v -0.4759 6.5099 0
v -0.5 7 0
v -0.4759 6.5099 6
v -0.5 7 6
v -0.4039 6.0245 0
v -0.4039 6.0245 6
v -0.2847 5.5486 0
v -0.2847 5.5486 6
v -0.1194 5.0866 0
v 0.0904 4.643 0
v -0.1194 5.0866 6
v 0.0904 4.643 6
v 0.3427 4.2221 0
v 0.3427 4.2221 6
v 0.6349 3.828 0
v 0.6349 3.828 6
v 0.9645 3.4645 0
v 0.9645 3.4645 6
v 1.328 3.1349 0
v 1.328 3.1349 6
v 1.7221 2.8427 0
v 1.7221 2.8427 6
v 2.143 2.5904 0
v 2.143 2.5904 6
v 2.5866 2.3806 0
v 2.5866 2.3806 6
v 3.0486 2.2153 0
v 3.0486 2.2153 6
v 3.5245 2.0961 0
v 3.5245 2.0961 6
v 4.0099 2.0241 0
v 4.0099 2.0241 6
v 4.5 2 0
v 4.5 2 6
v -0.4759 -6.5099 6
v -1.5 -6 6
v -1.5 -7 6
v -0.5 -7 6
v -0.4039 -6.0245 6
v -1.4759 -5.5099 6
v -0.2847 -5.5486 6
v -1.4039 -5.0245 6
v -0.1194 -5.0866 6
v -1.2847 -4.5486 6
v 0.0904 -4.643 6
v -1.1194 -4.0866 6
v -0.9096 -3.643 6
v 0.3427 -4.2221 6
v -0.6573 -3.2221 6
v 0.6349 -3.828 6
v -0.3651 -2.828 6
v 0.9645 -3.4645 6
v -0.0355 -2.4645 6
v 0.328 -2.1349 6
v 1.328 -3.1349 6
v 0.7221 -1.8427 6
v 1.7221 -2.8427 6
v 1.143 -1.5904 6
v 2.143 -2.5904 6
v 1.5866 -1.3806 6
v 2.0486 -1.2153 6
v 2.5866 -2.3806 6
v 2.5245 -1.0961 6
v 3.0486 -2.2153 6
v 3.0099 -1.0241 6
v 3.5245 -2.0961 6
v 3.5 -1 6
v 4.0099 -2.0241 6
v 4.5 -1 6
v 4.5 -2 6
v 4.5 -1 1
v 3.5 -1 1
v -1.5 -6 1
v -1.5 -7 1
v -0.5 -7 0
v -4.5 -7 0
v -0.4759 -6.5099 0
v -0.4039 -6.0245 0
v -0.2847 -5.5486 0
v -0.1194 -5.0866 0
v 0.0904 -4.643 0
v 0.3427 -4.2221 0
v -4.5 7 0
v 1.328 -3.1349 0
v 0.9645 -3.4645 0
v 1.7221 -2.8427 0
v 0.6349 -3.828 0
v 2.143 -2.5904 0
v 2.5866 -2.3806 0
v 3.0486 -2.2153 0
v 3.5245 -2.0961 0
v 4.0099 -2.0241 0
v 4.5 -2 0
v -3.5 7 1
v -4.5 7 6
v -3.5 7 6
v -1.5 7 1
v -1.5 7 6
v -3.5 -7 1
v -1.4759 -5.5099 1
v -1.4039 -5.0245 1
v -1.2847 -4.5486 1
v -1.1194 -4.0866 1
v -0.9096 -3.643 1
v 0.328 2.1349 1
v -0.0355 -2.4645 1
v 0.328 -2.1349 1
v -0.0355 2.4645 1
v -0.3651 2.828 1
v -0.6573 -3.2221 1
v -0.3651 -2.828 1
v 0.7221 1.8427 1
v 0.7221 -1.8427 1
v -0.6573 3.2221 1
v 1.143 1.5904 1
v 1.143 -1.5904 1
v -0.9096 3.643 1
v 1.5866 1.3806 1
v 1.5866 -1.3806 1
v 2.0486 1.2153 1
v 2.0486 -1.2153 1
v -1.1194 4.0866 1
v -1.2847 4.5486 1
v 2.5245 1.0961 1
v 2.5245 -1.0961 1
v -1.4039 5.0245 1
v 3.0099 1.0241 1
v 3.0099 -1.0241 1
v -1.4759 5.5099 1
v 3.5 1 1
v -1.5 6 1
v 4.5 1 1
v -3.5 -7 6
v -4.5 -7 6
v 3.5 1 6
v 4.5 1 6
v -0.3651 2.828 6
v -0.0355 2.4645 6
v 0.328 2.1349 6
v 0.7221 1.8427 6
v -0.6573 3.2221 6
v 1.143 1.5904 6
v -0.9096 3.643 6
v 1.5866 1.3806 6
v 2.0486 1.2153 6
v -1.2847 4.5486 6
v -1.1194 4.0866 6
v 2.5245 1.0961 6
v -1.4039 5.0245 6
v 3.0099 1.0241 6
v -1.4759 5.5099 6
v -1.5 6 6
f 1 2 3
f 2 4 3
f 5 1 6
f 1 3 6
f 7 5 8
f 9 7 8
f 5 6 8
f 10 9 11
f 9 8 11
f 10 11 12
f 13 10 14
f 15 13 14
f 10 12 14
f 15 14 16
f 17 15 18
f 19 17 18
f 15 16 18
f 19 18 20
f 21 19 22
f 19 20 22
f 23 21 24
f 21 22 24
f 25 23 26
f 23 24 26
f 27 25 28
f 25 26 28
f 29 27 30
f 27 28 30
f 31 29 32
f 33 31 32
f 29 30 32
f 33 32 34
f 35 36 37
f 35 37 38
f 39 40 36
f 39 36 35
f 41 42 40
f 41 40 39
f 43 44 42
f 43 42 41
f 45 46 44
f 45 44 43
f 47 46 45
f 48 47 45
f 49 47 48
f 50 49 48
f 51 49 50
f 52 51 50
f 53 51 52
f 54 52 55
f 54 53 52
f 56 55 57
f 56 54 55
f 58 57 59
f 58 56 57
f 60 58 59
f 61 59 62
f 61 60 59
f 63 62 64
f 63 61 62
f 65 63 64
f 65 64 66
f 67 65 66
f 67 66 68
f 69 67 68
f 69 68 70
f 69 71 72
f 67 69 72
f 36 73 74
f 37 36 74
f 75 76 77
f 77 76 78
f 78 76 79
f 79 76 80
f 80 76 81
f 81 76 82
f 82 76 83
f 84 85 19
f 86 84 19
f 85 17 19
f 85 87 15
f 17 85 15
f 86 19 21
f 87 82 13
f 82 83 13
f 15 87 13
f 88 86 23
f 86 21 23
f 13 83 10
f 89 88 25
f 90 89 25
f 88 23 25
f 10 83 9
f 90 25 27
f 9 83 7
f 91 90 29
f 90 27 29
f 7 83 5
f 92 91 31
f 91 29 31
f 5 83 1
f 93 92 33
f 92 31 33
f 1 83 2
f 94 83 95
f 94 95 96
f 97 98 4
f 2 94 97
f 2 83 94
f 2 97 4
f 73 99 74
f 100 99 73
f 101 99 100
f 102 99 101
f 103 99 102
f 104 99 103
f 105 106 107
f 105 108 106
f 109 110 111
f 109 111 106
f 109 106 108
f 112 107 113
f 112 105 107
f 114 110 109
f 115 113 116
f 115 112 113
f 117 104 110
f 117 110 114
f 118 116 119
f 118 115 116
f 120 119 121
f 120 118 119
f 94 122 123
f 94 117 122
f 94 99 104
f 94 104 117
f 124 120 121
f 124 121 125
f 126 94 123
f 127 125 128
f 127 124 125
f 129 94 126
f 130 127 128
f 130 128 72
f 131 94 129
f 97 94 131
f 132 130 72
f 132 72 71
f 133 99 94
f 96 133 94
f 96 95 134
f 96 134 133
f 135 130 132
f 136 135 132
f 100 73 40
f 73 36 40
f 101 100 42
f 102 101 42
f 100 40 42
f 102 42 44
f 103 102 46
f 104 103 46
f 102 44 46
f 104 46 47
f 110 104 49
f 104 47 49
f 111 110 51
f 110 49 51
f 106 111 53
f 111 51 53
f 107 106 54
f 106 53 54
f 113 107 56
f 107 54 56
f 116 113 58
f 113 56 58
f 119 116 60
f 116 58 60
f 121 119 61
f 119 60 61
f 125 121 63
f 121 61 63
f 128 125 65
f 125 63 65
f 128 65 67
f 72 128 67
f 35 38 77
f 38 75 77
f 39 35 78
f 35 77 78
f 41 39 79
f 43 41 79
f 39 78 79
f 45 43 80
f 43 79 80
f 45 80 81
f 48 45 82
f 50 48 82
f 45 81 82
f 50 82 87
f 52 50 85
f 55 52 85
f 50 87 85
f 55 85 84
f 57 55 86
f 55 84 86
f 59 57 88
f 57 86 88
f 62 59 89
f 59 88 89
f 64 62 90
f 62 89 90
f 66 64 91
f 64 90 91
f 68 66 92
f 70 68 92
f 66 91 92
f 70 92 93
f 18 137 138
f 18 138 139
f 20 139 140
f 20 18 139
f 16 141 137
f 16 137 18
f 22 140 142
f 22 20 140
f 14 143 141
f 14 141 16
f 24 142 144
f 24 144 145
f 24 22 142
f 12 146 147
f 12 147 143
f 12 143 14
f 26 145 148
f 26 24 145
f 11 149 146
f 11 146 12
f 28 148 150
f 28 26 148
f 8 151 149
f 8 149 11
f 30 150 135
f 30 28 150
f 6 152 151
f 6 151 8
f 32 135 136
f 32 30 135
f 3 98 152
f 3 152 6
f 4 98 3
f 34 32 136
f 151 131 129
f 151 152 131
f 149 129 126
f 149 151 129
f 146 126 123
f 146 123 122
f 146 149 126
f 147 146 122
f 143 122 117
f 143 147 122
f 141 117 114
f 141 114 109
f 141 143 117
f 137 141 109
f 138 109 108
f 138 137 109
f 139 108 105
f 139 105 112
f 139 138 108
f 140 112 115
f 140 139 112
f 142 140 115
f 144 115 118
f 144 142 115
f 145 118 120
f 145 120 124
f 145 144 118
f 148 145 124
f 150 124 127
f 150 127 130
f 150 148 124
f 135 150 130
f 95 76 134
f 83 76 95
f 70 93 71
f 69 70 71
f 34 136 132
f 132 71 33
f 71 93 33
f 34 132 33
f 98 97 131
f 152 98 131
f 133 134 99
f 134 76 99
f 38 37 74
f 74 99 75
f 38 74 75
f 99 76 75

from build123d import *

# Parameters (mm, degrees)
F0_W     = 5
F0_H     = 4
F1_DEPTH = 1
F2_W     = 1
F2_H     = 5
F3_DEPTH = 5
F4_R     = 4.99999
F2_H_2   = 14
F5_DEPTH = 5


# Not quite as in the source:
# - a fillet or chamfer is up to 0.001 mm smaller than in the source, because OpenCascade refuses the exact size


with BuildPart() as f1:
    # F0 (on Top) → F1 (new body)
    with BuildSketch(Plane.XY):
        Polygon((-4.5, -7), (-0.5, -7), (-0.5, -2), (-0.5, 2), (-0.5, 7), (-4.5, 7), align=None)
        with Locations((2, 0)):
            Rectangle(F0_W, F0_H)
    extrude(amount=F1_DEPTH)

    # F2 (on face) → F3 (join)
    with BuildSketch(Plane.XY.offset(1)):
        Polygon((-0.5, -2), (4.5, -2), (4.5, -1), (-1.5, -1), (-1.5, -2), align=None)
        with Locations((-1, -4.5)):
            Rectangle(F2_W, F2_H)
        Polygon((-1.5, 1), (4.5, 1), (4.5, 2), (-0.5, 2), (-1.5, 2), align=None)
        with Locations((-1, 4.5)):
            Rectangle(F2_W, F2_H)
    extrude(amount=F3_DEPTH)

    # F4 (radius 5 in the source; OpenCascade refuses exactly that, so slightly less here)
    f4_edges = [f1.edges().sort_by_distance(p)[0] for p in [
        (-0.5, -2, 3),
        (-1.5, 1, 3.5),
        (-1.5, -1, 3.5),
        (-0.5, 2, 3),
    ]]
    fillet(f4_edges, radius=F4_R)

    # F2 (on face) → F5 (join)
    with BuildSketch(Plane.XY.offset(1)):
        with Locations((-4, 0)):
            Rectangle(F2_W, F2_H_2)
    extrude(amount=F5_DEPTH)


solid = f1.part
